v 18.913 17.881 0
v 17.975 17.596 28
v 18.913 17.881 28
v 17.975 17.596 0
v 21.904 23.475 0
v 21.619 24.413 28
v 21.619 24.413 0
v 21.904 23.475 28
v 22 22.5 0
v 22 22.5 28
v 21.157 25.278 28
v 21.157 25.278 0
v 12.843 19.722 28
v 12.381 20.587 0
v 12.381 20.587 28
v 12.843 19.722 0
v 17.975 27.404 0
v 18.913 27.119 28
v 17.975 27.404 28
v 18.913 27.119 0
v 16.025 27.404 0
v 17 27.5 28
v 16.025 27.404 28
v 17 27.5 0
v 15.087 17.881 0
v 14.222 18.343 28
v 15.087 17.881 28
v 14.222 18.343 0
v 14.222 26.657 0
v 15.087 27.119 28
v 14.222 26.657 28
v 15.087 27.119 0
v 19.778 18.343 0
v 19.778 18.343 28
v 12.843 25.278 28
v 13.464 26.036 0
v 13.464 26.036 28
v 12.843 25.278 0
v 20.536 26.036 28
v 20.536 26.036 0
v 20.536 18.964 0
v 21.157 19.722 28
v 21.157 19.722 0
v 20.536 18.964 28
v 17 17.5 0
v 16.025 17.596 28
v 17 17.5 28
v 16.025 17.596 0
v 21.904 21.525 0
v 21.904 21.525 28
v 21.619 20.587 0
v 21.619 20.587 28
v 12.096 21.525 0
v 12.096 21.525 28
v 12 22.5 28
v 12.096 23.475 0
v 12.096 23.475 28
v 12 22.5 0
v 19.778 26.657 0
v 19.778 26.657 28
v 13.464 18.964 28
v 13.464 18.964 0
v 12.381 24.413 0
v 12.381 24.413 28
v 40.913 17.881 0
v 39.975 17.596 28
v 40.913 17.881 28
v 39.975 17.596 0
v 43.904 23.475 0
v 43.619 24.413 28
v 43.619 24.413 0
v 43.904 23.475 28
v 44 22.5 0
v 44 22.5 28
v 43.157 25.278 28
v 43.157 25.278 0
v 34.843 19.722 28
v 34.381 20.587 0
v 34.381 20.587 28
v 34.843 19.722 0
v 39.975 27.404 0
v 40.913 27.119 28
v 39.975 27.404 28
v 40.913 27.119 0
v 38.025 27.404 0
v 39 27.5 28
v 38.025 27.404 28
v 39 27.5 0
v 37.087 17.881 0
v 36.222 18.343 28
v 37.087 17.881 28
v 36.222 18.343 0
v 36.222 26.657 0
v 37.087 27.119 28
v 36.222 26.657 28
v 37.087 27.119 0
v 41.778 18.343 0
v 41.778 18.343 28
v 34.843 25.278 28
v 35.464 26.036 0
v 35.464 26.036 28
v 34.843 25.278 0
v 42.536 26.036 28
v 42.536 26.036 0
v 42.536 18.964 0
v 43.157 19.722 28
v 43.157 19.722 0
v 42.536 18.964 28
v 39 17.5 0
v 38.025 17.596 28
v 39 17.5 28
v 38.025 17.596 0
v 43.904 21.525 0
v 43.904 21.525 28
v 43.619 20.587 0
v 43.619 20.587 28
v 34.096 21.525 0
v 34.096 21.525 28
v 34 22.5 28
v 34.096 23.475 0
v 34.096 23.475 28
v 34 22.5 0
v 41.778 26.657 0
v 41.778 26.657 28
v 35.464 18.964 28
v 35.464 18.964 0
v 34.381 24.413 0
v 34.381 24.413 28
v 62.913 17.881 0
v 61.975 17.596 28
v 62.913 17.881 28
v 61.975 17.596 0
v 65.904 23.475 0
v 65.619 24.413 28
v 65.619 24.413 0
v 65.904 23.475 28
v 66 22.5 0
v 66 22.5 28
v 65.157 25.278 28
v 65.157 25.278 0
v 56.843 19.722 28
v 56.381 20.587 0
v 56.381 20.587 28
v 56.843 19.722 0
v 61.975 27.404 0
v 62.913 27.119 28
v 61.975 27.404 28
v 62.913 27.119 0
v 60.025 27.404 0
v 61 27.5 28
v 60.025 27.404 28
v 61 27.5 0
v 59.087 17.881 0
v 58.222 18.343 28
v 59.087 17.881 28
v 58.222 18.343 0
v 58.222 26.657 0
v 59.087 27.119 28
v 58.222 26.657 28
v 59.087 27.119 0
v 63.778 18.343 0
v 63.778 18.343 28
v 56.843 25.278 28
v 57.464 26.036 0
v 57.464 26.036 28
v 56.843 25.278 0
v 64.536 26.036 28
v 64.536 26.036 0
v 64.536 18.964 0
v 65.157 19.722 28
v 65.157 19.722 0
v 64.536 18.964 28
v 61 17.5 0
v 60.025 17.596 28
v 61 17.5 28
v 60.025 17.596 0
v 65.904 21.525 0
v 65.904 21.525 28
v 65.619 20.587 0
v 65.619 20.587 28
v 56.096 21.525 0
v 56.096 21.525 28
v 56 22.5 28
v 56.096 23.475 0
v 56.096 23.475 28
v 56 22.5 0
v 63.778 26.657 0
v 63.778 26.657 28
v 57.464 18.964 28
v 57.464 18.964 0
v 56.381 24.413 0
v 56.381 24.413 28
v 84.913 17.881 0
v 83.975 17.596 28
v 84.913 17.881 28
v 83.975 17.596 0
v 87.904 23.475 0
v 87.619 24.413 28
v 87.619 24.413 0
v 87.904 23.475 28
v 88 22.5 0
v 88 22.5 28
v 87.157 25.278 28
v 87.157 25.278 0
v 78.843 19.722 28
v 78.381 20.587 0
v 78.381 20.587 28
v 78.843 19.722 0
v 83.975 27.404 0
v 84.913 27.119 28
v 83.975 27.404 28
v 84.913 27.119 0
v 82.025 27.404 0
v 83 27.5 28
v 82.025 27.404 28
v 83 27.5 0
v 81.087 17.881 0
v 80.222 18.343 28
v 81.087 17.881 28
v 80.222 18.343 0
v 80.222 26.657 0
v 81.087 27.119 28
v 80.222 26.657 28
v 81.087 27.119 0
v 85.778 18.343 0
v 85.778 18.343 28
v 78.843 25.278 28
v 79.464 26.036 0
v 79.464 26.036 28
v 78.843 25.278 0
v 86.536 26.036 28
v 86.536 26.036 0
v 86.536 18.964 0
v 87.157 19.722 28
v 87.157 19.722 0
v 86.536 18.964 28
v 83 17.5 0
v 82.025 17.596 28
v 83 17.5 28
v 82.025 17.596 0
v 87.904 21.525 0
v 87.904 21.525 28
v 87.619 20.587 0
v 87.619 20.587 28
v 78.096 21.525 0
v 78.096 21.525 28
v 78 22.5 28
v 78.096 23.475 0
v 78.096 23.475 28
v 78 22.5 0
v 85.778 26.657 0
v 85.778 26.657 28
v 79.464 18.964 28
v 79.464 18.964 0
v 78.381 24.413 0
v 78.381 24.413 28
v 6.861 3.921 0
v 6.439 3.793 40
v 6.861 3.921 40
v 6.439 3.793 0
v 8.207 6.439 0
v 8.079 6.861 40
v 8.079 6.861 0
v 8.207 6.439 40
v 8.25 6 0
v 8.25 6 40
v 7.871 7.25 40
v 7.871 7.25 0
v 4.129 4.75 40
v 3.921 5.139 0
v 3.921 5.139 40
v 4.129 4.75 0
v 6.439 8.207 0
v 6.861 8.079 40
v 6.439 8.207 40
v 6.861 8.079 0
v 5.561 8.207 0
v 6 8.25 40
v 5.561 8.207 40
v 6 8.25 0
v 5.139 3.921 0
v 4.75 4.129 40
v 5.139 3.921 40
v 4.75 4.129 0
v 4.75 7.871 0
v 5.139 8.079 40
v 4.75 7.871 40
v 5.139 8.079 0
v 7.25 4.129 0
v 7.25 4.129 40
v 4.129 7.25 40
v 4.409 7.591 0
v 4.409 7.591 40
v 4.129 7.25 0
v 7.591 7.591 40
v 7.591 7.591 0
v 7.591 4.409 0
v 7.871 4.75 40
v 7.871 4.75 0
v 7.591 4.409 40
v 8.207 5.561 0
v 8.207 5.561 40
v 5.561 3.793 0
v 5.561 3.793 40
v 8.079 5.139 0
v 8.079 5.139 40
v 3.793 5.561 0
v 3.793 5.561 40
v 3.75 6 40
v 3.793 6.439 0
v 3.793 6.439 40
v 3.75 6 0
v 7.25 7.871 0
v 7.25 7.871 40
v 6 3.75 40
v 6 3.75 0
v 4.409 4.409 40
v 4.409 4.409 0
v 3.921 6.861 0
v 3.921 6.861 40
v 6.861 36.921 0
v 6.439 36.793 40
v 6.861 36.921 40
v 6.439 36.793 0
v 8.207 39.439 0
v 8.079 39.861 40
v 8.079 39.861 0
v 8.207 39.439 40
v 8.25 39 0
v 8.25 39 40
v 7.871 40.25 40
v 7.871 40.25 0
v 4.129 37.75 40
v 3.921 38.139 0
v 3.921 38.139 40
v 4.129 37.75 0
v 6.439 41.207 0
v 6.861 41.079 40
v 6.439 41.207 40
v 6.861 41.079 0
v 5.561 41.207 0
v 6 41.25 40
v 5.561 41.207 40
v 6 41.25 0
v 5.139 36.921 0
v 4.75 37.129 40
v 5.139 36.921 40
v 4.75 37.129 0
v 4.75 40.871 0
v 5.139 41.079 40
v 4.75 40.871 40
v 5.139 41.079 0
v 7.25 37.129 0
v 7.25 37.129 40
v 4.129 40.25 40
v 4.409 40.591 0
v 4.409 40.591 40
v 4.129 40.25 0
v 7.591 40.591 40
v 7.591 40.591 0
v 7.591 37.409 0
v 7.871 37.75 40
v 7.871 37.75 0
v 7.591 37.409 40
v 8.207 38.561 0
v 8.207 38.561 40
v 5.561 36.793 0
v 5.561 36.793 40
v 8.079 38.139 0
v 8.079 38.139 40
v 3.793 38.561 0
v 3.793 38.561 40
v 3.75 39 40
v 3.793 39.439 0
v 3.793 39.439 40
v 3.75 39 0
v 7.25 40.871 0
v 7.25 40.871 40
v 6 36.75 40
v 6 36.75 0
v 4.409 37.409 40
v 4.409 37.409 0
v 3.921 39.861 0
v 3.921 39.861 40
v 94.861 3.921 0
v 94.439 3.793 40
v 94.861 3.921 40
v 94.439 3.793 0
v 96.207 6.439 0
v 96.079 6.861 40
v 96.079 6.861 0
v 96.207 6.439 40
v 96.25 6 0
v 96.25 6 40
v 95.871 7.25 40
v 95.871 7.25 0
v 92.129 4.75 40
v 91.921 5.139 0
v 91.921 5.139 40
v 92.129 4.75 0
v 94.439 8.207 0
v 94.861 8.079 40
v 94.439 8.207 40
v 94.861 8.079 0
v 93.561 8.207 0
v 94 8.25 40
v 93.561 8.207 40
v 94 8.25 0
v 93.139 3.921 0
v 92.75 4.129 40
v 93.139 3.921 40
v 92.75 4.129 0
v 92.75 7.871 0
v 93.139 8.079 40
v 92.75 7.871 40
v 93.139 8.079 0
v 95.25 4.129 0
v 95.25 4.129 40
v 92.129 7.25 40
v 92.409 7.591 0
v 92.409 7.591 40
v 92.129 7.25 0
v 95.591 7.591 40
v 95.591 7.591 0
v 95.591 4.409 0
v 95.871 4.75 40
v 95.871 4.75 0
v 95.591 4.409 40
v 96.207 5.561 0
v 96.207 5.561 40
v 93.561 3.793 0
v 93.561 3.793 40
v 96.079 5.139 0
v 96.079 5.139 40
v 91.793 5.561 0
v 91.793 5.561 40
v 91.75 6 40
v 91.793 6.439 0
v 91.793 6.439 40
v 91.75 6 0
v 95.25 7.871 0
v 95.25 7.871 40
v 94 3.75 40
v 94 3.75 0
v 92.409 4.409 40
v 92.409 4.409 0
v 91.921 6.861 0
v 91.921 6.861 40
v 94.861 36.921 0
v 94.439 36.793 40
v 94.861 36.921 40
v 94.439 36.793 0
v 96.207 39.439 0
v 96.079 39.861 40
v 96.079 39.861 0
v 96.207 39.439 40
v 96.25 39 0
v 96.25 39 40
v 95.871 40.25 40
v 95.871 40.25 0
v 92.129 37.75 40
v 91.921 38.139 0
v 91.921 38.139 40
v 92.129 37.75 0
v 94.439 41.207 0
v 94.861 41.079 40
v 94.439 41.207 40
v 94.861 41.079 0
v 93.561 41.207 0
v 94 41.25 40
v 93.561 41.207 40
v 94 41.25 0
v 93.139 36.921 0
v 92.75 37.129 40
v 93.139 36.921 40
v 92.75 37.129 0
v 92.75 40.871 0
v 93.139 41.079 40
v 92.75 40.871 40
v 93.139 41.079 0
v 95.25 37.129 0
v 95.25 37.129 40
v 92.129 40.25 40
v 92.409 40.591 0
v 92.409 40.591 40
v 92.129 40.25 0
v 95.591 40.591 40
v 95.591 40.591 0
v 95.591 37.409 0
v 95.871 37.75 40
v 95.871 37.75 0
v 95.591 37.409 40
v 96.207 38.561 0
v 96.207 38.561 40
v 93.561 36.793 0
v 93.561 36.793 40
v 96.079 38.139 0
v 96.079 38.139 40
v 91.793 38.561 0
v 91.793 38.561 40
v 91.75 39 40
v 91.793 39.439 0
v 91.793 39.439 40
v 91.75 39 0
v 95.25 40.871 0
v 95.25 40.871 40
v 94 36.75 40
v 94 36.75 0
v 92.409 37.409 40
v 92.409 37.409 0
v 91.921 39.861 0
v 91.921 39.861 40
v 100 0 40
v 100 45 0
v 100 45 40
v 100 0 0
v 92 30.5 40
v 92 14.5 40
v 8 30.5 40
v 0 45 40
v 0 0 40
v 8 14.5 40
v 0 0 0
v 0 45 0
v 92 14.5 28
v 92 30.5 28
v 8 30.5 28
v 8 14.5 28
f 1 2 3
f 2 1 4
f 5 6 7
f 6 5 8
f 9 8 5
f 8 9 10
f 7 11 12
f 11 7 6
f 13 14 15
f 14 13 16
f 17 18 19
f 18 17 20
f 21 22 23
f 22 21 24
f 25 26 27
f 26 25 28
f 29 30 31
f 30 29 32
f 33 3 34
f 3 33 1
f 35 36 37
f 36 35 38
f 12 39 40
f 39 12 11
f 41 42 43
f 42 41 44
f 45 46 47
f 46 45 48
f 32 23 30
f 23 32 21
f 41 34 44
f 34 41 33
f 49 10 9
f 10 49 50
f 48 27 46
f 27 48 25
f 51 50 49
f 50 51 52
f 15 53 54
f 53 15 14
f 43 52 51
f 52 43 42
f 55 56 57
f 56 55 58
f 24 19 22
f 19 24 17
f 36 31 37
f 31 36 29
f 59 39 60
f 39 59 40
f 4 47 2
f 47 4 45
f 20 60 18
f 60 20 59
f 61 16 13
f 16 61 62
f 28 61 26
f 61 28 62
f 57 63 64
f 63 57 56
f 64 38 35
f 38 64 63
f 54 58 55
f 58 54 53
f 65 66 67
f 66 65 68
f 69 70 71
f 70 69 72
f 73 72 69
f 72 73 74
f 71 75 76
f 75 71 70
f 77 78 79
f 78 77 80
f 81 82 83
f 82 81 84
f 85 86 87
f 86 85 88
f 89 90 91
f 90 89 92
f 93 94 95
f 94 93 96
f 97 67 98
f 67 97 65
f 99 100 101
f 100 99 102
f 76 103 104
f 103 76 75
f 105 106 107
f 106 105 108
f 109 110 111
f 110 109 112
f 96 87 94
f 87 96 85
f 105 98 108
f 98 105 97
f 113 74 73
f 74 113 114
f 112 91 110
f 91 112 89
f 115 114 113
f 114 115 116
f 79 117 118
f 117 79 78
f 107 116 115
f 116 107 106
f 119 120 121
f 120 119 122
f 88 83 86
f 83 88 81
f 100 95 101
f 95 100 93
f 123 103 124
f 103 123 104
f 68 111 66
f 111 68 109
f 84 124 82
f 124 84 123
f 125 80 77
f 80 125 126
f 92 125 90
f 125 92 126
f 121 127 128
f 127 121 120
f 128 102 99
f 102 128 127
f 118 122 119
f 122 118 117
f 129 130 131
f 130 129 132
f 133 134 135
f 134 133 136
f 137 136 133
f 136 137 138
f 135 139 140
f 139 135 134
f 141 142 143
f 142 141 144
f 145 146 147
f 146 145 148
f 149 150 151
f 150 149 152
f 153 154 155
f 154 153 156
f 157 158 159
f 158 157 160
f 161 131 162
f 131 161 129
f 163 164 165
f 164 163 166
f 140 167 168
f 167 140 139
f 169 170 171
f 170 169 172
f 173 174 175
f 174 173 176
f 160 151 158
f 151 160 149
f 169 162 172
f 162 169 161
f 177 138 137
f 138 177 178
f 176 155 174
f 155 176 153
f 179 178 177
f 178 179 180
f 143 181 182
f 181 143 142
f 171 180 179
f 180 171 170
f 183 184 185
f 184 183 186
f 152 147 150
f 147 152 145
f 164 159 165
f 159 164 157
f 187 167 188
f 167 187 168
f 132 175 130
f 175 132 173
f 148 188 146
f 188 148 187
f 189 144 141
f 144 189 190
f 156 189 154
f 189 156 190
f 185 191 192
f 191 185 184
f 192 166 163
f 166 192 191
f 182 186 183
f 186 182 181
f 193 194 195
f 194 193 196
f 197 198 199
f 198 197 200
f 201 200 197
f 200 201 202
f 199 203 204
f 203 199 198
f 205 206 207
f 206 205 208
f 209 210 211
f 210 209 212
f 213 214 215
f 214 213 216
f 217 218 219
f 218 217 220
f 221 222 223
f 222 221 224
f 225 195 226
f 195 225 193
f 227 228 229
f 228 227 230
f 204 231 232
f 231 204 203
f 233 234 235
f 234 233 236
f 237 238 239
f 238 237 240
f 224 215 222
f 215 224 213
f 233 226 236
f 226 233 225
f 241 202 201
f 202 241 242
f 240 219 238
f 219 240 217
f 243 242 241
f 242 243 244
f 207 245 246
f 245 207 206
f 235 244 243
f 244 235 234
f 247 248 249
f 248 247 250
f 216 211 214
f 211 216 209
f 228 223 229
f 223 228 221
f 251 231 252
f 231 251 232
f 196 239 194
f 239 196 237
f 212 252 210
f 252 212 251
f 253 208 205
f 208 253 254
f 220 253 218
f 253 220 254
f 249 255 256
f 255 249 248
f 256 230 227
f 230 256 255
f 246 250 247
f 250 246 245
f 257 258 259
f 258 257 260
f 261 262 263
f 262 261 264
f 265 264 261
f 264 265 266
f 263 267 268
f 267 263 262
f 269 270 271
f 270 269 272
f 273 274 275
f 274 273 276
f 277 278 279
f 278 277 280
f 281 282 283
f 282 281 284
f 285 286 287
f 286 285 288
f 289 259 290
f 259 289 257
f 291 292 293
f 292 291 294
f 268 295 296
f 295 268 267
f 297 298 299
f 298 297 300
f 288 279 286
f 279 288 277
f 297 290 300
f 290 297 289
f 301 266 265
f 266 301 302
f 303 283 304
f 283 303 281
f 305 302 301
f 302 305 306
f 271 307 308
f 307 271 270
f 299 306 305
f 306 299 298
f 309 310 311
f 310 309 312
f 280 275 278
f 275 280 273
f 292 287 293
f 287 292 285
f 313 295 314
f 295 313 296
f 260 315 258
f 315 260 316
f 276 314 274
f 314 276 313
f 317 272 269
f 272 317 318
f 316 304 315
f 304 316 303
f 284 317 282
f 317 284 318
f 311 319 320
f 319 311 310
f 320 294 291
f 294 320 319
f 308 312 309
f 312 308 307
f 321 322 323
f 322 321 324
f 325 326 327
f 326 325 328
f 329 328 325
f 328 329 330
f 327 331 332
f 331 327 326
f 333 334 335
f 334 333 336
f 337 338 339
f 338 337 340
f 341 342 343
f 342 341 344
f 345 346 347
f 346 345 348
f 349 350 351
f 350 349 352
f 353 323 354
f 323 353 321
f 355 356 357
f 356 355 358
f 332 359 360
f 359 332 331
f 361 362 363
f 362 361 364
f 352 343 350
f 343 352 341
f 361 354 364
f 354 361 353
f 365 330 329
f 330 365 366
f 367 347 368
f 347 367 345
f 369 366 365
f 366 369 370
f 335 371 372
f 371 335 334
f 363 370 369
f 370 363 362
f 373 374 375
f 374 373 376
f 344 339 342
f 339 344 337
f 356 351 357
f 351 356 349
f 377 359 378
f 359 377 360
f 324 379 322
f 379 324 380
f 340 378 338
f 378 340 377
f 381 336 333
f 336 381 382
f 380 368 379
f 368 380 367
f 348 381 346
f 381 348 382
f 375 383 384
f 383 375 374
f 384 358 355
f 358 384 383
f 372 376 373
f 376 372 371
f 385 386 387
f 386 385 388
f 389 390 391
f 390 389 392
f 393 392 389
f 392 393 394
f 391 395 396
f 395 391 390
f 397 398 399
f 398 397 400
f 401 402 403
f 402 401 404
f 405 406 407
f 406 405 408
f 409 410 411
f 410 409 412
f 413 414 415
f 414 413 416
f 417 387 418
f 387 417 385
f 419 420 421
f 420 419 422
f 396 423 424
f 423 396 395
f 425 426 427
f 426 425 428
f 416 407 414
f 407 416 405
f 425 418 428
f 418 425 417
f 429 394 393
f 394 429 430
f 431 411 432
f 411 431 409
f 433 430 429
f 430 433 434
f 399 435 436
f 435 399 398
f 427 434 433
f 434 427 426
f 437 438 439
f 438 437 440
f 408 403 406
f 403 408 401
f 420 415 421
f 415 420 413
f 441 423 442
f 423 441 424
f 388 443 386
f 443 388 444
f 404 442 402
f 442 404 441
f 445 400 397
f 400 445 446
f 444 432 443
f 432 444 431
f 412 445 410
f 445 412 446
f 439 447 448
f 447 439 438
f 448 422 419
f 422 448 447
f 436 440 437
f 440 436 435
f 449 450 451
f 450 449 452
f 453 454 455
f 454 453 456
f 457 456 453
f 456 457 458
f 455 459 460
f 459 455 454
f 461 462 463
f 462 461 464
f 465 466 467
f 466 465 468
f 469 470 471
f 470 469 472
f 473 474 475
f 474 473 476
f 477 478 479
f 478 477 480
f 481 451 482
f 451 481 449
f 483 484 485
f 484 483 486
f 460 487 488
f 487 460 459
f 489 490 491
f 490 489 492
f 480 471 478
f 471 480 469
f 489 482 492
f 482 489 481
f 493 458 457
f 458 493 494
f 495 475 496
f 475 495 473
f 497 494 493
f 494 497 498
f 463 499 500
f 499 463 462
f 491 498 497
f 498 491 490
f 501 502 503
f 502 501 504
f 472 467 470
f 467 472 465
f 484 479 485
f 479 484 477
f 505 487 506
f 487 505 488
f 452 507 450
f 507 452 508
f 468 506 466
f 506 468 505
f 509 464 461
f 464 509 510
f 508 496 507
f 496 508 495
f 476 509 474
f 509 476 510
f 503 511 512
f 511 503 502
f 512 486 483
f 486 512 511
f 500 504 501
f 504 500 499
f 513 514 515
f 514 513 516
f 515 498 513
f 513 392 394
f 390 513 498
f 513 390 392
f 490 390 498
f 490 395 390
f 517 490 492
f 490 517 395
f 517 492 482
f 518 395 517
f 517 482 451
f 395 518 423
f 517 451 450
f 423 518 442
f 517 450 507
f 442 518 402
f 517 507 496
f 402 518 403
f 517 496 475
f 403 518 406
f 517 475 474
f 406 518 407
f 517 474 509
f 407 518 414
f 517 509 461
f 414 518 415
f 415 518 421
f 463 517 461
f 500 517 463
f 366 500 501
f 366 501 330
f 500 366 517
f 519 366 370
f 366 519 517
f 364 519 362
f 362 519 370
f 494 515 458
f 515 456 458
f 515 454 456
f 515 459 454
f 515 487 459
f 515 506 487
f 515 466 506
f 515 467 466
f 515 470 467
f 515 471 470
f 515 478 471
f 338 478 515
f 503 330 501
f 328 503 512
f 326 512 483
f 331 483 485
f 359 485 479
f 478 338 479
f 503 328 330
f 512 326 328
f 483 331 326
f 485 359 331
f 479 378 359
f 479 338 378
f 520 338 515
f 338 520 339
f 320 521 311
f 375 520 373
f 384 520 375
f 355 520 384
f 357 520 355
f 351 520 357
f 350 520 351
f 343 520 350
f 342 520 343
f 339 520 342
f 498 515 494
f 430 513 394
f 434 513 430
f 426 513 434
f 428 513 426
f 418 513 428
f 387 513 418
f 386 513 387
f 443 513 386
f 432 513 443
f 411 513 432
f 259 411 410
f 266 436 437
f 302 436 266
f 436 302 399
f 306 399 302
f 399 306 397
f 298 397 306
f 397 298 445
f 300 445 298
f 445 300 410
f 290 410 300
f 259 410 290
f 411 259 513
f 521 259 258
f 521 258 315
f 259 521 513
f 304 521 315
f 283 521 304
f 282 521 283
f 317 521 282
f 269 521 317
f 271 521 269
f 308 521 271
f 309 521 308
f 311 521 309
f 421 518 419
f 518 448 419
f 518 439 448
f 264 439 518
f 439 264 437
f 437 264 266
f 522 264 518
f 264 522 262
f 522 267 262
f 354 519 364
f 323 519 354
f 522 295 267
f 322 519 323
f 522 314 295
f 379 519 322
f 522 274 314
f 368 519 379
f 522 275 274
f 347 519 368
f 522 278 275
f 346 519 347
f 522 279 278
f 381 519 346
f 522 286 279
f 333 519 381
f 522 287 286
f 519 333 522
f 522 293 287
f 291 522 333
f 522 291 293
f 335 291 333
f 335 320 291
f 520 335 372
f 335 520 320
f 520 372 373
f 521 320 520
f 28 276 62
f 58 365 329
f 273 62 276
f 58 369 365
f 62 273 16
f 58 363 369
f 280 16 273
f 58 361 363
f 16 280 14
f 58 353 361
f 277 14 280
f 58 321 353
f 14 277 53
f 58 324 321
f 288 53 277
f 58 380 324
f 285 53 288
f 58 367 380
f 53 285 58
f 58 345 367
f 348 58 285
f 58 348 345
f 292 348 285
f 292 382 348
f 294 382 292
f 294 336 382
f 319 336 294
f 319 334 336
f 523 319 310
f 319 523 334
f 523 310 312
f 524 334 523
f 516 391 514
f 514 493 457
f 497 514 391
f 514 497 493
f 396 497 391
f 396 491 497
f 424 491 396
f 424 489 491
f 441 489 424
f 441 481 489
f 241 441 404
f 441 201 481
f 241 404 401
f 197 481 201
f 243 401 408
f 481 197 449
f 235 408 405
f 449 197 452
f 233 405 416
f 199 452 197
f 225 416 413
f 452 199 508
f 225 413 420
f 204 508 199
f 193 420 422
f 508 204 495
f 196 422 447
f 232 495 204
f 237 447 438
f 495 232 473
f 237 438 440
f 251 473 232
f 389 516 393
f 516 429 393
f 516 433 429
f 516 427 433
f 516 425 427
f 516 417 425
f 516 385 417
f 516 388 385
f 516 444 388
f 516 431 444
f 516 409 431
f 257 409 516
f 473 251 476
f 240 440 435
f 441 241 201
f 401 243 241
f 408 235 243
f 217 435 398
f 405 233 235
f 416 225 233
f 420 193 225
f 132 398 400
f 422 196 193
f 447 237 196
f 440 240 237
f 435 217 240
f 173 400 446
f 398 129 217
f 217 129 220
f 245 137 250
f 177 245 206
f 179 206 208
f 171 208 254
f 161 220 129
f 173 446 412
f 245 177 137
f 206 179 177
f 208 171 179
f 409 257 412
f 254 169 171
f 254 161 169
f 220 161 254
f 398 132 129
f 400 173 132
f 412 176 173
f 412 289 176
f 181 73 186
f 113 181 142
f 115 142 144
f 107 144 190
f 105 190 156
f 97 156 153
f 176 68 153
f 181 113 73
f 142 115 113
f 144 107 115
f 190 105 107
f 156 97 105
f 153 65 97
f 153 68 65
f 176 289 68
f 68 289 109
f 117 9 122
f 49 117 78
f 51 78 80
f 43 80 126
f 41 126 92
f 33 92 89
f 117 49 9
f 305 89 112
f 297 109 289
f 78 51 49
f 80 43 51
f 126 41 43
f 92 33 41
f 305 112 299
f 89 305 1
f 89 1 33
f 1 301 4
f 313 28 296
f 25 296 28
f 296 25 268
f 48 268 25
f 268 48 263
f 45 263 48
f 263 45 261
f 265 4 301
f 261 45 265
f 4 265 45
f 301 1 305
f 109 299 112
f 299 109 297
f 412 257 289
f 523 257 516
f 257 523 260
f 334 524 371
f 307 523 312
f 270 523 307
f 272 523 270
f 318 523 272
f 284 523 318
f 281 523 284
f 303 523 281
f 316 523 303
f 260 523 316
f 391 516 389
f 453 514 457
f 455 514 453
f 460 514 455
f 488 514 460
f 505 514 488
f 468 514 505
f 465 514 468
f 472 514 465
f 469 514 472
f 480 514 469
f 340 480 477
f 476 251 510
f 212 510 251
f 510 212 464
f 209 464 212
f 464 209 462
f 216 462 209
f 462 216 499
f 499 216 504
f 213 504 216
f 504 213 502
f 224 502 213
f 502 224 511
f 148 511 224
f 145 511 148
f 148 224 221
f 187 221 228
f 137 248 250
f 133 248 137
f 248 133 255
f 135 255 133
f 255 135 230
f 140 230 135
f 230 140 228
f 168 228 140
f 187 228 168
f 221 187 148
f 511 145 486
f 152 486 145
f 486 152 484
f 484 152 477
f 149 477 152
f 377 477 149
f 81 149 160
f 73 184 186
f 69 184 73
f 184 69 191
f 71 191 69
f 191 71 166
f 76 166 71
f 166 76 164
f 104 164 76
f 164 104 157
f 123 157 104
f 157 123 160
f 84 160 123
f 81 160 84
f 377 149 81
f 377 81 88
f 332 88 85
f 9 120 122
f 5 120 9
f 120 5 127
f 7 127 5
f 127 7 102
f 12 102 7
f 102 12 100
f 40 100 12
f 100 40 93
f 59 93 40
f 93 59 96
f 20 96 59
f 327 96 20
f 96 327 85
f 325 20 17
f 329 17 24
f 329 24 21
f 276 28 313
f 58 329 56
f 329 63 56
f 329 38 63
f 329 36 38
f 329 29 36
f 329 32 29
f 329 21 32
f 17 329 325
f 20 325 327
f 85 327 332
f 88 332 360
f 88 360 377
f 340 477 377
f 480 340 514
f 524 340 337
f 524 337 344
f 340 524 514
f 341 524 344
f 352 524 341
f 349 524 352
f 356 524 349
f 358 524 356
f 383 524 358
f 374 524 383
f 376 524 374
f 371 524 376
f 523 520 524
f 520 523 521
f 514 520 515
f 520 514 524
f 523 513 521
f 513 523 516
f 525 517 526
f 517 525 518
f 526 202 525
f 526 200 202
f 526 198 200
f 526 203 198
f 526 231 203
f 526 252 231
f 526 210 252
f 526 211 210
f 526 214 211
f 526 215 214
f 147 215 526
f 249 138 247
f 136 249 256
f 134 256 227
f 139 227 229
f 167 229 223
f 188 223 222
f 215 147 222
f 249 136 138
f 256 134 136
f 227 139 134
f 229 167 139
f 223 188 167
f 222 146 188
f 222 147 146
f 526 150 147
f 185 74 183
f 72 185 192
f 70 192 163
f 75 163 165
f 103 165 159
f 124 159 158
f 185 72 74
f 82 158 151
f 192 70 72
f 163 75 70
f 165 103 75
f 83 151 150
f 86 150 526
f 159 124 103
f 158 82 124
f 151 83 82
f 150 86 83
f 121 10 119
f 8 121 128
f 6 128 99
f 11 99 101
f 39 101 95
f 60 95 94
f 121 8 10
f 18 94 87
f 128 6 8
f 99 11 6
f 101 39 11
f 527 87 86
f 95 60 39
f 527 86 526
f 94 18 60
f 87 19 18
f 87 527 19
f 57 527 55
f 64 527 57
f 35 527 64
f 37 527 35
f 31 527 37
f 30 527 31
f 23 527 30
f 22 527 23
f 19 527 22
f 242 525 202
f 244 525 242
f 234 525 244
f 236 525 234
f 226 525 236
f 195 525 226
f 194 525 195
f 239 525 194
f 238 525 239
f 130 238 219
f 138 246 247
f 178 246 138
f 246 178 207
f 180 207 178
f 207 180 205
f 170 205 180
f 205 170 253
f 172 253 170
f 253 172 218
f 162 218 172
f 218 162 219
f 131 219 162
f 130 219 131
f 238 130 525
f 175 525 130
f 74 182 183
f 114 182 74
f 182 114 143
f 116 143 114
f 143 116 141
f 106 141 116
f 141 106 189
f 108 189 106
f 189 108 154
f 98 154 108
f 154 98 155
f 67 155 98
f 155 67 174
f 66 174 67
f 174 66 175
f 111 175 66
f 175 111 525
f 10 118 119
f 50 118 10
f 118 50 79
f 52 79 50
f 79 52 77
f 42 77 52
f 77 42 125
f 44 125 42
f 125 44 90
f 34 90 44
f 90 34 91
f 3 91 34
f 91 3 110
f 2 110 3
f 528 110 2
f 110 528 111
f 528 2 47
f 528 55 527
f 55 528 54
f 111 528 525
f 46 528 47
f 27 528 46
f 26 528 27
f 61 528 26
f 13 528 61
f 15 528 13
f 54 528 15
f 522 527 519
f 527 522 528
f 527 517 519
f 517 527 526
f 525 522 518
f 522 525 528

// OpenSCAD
$fn = 32;

// ----------------------------------------------------------------------
// Manifold block: gallery_top manifold
// ----------------------------------------------------------------------

// --- parameters (mm) ---
block_l = 100;            // block length, X
block_w = 45;             // block width, Y
block_h = 40;             // block height, Z
port_d = 10;              // port bore diameter
port_pitch = 22;          // port pitch along X
gallery_d = 16;           // top gallery width, Y
gallery_depth = 12;       // gallery pocket depth
wall_p = 8;               // gallery end wall thickness, X
mnt_d = 4.5;              // mounting hole diameter
mnt_in = 6;               // mounting hole inset from the edges

n_ports = 4;  // ports in the row
port_x0 = (block_l - (n_ports - 1) * port_pitch) / 2;  // first port X

difference() {
  cube([block_l, block_w, block_h]);
  for (i = [0 : n_ports - 1])
    translate([port_x0 + i * port_pitch, block_w / 2, -1])
      cylinder(h = block_h + 2, d = port_d);
  translate([wall_p, block_w / 2 - gallery_d / 2, block_h - gallery_depth])
    cube([block_l - 2 * wall_p, gallery_d, gallery_depth + 1]);
  for (cx = [mnt_in, block_l - mnt_in])
    for (cy = [mnt_in, block_w - mnt_in])
      translate([cx, cy, -1]) cylinder(h = block_h + 2, d = mnt_d);
}
